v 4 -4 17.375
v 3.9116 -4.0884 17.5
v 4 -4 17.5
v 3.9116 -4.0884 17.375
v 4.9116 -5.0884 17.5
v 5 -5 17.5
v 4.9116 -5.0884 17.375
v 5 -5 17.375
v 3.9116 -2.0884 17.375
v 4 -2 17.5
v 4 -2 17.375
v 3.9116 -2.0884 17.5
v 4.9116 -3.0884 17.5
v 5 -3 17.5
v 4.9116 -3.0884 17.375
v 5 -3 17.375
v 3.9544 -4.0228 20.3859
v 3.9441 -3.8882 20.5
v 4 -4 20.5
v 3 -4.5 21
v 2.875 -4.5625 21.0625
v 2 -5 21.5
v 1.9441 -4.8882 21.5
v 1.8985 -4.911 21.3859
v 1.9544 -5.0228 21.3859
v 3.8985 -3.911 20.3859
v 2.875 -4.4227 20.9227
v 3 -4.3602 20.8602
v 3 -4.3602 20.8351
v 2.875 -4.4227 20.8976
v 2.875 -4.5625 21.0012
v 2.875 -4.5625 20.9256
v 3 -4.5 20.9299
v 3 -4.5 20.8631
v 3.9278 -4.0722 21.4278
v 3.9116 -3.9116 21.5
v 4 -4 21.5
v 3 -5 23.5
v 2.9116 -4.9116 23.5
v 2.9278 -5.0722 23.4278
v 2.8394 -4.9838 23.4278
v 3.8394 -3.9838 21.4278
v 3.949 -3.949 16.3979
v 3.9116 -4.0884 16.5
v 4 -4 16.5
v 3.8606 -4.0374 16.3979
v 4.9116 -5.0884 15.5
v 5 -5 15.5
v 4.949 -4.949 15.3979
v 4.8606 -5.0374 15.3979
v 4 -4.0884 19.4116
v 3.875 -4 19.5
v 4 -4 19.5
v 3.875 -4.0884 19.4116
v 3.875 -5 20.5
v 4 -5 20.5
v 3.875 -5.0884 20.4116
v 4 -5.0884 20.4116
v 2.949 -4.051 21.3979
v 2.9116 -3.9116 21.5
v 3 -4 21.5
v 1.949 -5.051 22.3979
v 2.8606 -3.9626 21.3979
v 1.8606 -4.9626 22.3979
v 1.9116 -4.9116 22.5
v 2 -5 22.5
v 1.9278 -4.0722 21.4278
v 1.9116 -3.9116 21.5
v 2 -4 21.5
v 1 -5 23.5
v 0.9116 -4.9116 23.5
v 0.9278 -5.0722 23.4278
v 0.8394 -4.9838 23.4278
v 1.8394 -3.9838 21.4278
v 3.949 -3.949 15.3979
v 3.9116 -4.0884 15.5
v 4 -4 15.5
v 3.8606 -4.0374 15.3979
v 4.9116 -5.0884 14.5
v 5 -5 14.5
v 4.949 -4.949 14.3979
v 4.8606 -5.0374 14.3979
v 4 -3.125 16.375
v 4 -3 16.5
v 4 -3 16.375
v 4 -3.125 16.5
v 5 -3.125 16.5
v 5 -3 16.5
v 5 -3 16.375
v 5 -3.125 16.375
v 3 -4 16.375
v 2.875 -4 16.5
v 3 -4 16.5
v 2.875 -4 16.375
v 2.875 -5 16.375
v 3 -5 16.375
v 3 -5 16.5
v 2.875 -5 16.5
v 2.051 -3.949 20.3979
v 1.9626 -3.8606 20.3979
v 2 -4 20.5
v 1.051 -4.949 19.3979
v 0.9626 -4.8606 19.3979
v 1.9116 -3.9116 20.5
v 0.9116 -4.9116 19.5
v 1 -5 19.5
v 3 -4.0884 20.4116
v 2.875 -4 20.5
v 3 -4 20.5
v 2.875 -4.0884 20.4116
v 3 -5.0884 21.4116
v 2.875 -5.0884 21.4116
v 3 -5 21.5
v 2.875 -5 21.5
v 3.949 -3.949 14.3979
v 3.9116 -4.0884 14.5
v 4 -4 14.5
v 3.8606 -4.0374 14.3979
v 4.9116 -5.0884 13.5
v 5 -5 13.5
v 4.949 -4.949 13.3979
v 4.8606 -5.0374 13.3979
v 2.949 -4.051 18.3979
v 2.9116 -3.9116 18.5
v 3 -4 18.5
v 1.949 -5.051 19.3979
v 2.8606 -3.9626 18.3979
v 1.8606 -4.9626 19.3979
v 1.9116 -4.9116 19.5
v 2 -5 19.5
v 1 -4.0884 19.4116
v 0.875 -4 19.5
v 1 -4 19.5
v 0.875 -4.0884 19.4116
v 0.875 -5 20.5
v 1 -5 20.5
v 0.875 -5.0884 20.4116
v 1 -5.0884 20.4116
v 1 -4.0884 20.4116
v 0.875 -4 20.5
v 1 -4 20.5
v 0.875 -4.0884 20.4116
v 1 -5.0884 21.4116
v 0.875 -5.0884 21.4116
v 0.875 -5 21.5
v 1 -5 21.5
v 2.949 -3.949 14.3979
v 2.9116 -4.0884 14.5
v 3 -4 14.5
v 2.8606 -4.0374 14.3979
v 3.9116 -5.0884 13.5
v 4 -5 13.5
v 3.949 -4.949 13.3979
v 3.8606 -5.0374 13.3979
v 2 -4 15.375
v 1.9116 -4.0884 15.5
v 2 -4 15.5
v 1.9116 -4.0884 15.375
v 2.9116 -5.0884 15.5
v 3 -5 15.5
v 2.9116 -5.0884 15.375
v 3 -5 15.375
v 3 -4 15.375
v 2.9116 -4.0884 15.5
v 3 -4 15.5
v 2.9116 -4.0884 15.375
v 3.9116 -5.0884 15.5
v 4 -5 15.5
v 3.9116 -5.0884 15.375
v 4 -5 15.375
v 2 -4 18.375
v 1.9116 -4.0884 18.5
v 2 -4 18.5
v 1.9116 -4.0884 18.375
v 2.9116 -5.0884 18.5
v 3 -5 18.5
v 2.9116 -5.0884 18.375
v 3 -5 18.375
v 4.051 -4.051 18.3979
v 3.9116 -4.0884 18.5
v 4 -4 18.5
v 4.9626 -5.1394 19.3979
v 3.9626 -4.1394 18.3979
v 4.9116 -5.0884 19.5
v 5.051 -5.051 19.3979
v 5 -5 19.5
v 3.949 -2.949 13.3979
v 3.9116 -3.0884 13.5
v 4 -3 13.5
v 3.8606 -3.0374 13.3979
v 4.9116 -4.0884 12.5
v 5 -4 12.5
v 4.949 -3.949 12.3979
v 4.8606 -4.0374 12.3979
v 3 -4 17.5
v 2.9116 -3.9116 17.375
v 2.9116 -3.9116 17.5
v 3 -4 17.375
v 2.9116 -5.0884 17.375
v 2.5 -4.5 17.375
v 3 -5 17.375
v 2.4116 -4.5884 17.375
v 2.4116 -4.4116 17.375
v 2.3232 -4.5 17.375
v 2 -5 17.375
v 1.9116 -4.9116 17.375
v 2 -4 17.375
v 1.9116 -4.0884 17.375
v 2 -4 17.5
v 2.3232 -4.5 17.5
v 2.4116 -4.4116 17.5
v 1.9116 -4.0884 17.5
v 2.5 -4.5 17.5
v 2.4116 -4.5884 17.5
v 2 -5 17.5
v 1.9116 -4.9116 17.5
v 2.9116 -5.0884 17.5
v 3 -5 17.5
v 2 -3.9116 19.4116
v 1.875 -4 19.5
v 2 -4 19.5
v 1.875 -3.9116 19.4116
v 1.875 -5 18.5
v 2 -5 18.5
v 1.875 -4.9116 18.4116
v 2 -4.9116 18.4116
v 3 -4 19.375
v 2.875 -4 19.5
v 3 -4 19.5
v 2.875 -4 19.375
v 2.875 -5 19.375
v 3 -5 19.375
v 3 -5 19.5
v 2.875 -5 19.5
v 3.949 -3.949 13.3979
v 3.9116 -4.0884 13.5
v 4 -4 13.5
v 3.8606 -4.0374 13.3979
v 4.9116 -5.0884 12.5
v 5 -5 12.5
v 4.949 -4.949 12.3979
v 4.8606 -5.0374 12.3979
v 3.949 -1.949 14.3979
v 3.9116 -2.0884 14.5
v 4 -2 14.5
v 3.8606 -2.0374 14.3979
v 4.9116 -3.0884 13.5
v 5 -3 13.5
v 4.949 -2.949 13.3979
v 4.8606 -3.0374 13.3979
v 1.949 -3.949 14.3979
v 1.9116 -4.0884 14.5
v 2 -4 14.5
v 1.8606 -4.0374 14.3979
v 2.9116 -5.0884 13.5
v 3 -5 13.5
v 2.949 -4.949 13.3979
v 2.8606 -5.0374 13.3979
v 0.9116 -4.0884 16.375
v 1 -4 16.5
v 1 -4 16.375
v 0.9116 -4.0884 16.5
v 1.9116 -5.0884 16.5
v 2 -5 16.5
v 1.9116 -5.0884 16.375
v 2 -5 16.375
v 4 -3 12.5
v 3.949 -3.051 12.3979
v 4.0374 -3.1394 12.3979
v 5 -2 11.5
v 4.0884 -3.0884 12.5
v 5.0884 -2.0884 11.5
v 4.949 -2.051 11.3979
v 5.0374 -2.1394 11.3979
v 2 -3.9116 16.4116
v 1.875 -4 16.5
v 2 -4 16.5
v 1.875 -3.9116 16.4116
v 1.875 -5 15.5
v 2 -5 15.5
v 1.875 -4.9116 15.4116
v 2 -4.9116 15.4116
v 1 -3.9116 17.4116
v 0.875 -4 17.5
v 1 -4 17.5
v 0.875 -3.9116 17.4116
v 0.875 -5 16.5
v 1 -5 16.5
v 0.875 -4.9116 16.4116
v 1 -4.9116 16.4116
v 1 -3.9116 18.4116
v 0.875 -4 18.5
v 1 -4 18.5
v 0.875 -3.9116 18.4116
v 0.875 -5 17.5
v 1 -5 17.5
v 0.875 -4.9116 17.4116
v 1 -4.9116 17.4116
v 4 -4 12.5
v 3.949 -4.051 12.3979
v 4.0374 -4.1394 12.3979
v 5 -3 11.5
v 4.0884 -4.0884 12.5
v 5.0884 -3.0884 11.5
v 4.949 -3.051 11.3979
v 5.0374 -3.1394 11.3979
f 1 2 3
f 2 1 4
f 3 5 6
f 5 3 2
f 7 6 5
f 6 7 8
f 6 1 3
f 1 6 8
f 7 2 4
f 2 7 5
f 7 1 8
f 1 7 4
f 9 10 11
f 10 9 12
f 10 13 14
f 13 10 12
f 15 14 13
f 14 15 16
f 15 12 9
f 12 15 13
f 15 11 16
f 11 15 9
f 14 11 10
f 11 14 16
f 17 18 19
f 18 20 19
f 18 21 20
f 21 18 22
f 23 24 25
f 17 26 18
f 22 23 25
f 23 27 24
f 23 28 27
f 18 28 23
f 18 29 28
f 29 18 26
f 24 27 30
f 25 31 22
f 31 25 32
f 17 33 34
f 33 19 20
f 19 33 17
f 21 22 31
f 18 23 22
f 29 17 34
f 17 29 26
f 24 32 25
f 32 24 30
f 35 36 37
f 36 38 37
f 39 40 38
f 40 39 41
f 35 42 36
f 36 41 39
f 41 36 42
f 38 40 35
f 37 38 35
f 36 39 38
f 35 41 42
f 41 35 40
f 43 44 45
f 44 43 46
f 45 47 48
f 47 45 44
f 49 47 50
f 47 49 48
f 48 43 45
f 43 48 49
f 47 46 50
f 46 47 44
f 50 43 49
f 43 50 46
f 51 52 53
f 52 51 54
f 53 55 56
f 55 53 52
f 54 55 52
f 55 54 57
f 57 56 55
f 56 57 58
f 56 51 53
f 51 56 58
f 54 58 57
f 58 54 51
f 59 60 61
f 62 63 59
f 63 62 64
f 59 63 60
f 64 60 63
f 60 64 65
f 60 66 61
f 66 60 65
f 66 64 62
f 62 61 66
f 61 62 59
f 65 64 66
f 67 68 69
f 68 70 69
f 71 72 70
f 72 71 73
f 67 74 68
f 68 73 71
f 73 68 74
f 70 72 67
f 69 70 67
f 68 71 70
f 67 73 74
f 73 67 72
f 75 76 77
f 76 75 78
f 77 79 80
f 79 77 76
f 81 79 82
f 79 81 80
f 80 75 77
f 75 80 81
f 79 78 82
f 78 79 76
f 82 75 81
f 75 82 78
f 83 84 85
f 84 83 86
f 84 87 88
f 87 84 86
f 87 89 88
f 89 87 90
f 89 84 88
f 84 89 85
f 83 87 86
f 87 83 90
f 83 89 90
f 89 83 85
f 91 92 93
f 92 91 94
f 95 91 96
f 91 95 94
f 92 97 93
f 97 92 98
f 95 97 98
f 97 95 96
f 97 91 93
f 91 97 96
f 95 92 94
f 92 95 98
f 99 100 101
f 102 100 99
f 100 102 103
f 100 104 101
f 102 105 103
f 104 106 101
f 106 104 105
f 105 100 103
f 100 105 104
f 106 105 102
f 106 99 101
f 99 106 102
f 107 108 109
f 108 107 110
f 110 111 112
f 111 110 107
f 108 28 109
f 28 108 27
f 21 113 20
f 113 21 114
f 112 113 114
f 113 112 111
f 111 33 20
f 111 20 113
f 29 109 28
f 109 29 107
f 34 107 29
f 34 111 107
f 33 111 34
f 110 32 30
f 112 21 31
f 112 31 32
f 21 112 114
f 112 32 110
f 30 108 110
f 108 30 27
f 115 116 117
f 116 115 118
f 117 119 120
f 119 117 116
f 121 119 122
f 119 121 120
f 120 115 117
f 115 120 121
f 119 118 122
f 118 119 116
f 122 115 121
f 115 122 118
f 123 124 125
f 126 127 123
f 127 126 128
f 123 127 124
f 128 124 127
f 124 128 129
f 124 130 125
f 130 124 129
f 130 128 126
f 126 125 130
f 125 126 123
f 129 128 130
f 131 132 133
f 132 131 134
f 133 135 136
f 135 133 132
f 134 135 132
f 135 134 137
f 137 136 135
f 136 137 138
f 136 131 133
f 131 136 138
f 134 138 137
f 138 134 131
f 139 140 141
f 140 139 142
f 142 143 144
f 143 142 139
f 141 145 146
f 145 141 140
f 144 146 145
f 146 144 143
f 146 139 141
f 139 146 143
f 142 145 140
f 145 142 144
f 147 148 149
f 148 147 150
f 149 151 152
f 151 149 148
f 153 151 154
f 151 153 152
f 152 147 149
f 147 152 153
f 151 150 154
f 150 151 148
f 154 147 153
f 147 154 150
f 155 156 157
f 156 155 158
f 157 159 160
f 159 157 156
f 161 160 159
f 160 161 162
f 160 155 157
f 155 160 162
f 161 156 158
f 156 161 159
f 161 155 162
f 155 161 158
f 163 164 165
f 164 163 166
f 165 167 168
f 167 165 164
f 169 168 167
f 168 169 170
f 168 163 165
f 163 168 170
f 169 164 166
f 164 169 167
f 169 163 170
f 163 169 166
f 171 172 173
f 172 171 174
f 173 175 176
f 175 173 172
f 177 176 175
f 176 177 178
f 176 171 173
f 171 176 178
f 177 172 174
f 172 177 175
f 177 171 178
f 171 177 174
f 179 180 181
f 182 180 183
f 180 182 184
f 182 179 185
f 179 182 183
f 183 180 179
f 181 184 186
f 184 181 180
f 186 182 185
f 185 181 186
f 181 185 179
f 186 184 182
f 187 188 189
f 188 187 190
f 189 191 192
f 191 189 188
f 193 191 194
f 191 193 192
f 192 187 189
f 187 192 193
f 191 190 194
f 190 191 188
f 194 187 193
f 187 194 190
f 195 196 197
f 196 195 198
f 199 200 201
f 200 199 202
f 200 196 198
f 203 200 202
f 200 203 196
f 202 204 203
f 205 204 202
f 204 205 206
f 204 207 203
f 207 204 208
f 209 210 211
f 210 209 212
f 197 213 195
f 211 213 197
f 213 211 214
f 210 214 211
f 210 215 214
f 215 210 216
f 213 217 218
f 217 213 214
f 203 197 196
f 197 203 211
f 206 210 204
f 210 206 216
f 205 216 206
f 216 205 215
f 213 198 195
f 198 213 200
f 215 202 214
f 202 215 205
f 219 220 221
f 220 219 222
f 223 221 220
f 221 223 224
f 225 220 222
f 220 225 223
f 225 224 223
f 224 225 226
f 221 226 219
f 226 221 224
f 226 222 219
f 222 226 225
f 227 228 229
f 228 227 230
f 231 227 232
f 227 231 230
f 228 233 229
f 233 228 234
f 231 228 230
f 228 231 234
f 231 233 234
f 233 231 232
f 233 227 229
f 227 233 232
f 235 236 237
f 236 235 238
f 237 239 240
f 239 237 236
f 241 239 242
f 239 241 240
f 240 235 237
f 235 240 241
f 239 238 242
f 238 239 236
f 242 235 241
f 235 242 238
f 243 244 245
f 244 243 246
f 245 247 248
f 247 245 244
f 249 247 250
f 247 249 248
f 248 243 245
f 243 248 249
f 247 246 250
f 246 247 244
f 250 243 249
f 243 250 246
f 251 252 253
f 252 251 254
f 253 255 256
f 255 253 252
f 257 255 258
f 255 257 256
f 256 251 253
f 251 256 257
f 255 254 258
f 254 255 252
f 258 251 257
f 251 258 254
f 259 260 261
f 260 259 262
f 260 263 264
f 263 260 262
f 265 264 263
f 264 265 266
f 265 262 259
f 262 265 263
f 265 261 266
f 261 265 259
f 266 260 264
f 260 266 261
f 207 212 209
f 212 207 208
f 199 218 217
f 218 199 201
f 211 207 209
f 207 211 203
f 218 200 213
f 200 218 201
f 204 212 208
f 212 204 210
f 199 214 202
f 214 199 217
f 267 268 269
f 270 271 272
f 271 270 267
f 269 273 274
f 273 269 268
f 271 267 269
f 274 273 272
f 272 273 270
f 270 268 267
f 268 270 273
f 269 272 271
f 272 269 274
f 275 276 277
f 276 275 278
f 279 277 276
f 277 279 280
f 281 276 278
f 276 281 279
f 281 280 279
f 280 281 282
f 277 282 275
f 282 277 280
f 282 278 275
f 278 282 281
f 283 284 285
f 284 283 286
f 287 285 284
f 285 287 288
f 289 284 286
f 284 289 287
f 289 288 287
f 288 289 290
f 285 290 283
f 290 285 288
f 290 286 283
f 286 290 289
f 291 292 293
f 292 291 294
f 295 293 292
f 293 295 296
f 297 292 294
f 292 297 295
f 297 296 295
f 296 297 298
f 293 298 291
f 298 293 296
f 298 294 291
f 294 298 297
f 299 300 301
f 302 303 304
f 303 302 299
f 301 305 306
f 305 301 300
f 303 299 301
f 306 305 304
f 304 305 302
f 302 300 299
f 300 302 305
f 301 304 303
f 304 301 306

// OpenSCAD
translate(v = [-0.5, -0.5, 0]) {
	/*Shell 0*/
	union() {
		%/*Nodes shell 0*/
		union();
		/*Edges shell 0*/
		union();
	}
	/*Shell 1*/
	union() {
		%/*Nodes shell 1*/
		union();
		/*Edges shell 1*/
		union();
	}
	/*Shell 2*/
	union() {
		%/*Nodes shell 2*/
		union();
		/*Edges shell 2*/
		union();
	}
	/*Shell 3*/
	union() {
		%/*Nodes shell 3*/
		union() {
			/*Node bank.devices[0].thingy.vbead_in*/
			color(alpha = 0.1, c = "black") {
				translate(v = [4, -4, 17]) {
					cube(size = [1, 1, 1]);
				}
			}
			/*Node bank.devices[0].thingy.vbead_out*/
			color(alpha = 0.1, c = "black") {
				translate(v = [4, -2, 17]) {
					cube(size = [1, 1, 1]);
				}
			}
			/*Node bank.devices[0].thingy.vcell_in*/
			color(alpha = 0.1, c = "black") {
				translate(v = [4, -4, 20]) {
					cube(size = [1, 1, 1]);
				}
			}
			/*Node bank.devices[0].thingy.vcell_out*/
			color(alpha = 0.1, c = "black") {
				translate(v = [4, -4, 21]) {
					cube(size = [1, 1, 1]);
				}
			}
			/*Node bank.devices[0].thingy.vcollect*/
			color(alpha = 0.1, c = "black") {
				translate(v = [4, -4, 16]) {
					cube(size = [1, 1, 1]);
				}
			}
			/*Node bank.devices[0].thingy.vlysis_in*/
			color(alpha = 0.1, c = "black") {
				translate(v = [4, -4, 19]) {
					cube(size = [1, 1, 1]);
				}
			}
			/*Node bank.devices[0].thingy.vlysis_out*/
			color(alpha = 0.1, c = "black") {
				translate(v = [3, -4, 21]) {
					cube(size = [1, 1, 1]);
				}
			}
			/*Node bank.devices[0].thingy.vpush*/
			color(alpha = 0.1, c = "black") {
				translate(v = [2, -4, 21]) {
					cube(size = [1, 1, 1]);
				}
			}
			/*Node bank.devices[0].thingy.vwaste*/
			color(alpha = 0.1, c = "black") {
				translate(v = [4, -4, 15]) {
					cube(size = [1, 1, 1]);
				}
			}
			/*Node bank.devices[1].thingy.vbead_in*/
			color(alpha = 0.1, c = "black") {
				translate(v = [4, -3, 16]) {
					cube(size = [1, 1, 1]);
				}
			}
			/*Node bank.devices[1].thingy.vbead_out*/
			color(alpha = 0.1, c = "black") {
				translate(v = [3, -4, 16]) {
					cube(size = [1, 1, 1]);
				}
			}
			/*Node bank.devices[1].thingy.vcell_in*/
			color(alpha = 0.1, c = "black") {
				translate(v = [2, -4, 20]) {
					cube(size = [1, 1, 1]);
				}
			}
			/*Node bank.devices[1].thingy.vcell_out*/
			color(alpha = 0.1, c = "black") {
				translate(v = [3, -4, 20]) {
					cube(size = [1, 1, 1]);
				}
			}
			/*Node bank.devices[1].thingy.vcollect*/
			color(alpha = 0.1, c = "black") {
				translate(v = [4, -4, 14]) {
					cube(size = [1, 1, 1]);
				}
			}
			/*Node bank.devices[1].thingy.vlysis_in*/
			color(alpha = 0.1, c = "black") {
				translate(v = [3, -4, 18]) {
					cube(size = [1, 1, 1]);
				}
			}
			/*Node bank.devices[1].thingy.vlysis_out*/
			color(alpha = 0.1, c = "black") {
				translate(v = [1, -4, 19]) {
					cube(size = [1, 1, 1]);
				}
			}
			/*Node bank.devices[1].thingy.vpush*/
			color(alpha = 0.1, c = "black") {
				translate(v = [1, -4, 20]) {
					cube(size = [1, 1, 1]);
				}
			}
			/*Node bank.devices[1].thingy.vwaste*/
			color(alpha = 0.1, c = "black") {
				translate(v = [3, -4, 14]) {
					cube(size = [1, 1, 1]);
				}
			}
			/*Node bank.devices[2].thingy.vbead_in*/
			color(alpha = 0.1, c = "black") {
				translate(v = [2, -4, 15]) {
					cube(size = [1, 1, 1]);
				}
			}
			/*Node bank.devices[2].thingy.vbead_out*/
			color(alpha = 0.1, c = "black") {
				translate(v = [3, -4, 15]) {
					cube(size = [1, 1, 1]);
				}
			}
			/*Node bank.devices[2].thingy.vcell_in*/
			color(alpha = 0.1, c = "black") {
				translate(v = [2, -4, 18]) {
					cube(size = [1, 1, 1]);
				}
			}
			/*Node bank.devices[2].thingy.vcell_out*/
			color(alpha = 0.1, c = "black") {
				translate(v = [4, -4, 18]) {
					cube(size = [1, 1, 1]);
				}
			}
			/*Node bank.devices[2].thingy.vcollect*/
			color(alpha = 0.1, c = "black") {
				translate(v = [4, -3, 13]) {
					cube(size = [1, 1, 1]);
				}
			}
			/*Node bank.devices[2].thingy.vlysis_in*/
			color(alpha = 0.1, c = "black") {
				translate(v = [3, -4, 17]) {
					cube(size = [1, 1, 1]);
				}
			}
			/*Node bank.devices[2].thingy.vlysis_out*/
			color(alpha = 0.1, c = "black") {
				translate(v = [2, -4, 19]) {
					cube(size = [1, 1, 1]);
				}
			}
			/*Node bank.devices[2].thingy.vpush*/
			color(alpha = 0.1, c = "black") {
				translate(v = [3, -4, 19]) {
					cube(size = [1, 1, 1]);
				}
			}
			/*Node bank.devices[2].thingy.vwaste*/
			color(alpha = 0.1, c = "black") {
				translate(v = [4, -4, 13]) {
					cube(size = [1, 1, 1]);
				}
			}
			/*Node bank.devices[3].thingy.vbead_in*/
			color(alpha = 0.1, c = "black") {
				translate(v = [4, -2, 14]) {
					cube(size = [1, 1, 1]);
				}
			}
			/*Node bank.devices[3].thingy.vbead_out*/
			color(alpha = 0.1, c = "black") {
				translate(v = [2, -4, 14]) {
					cube(size = [1, 1, 1]);
				}
			}
			/*Node bank.devices[3].thingy.vcell_in*/
			color(alpha = 0.1, c = "black") {
				translate(v = [1, -4, 16]) {
					cube(size = [1, 1, 1]);
				}
			}
			/*Node bank.devices[3].thingy.vcell_out*/
			color(alpha = 0.1, c = "black") {
				translate(v = [2, -4, 17]) {
					cube(size = [1, 1, 1]);
				}
			}
			/*Node bank.devices[3].thingy.vcollect*/
			color(alpha = 0.1, c = "black") {
				translate(v = [4, -3, 12]) {
					cube(size = [1, 1, 1]);
				}
			}
			/*Node bank.devices[3].thingy.vlysis_in*/
			color(alpha = 0.1, c = "black") {
				translate(v = [2, -4, 16]) {
					cube(size = [1, 1, 1]);
				}
			}
			/*Node bank.devices[3].thingy.vlysis_out*/
			color(alpha = 0.1, c = "black") {
				translate(v = [1, -4, 17]) {
					cube(size = [1, 1, 1]);
				}
			}
			/*Node bank.devices[3].thingy.vpush*/
			color(alpha = 0.1, c = "black") {
				translate(v = [1, -4, 18]) {
					cube(size = [1, 1, 1]);
				}
			}
			/*Node bank.devices[3].thingy.vwaste*/
			color(alpha = 0.1, c = "black") {
				translate(v = [4, -4, 12]) {
					cube(size = [1, 1, 1]);
				}
			}
		}
		/*Edges shell 3*/
		union() {
			/*Edge 2 from bank.devices[0].thingy.vbead_in to $_2*/
			translate(v = [5.5, -4.5, 17.5]) {
				rotate(a = [0, 90.0, 135.0]) {
					cube(size = [0.125, 0.125, 1.4142135623730951]);
				}
			}
			/*Edge 6 from bank.devices[0].thingy.vbead_out to $_6*/
			translate(v = [5.5, -2.5, 17.5]) {
				rotate(a = [0, 90.0, 135.0]) {
					cube(size = [0.125, 0.125, 1.4142135623730951]);
				}
			}
			/*Edge 10 from bank.devices[0].thingy.vcell_in to $_10*/
			translate(v = [2.5, -4.5, 21.5]) {
				rotate(a = [0, 114.09484255211072, 26.56505117707799]) {
					cube(size = [0.125, 0.125, 2.449489742783178]);
				}
			}
			/*Edge 14 from bank.devices[0].thingy.vcell_out to $_14*/
			translate(v = [3.5, -4.5, 23.5]) {
				rotate(a = [0, 144.73561031724537, 45.0]) {
					cube(size = [0.125, 0.125, 2.449489742783178]);
				}
			}
			/*Edge 18 from bank.devices[0].thingy.vcollect to $_18*/
			translate(v = [5.5, -4.5, 15.5]) {
				rotate(a = [0, 54.735610317245346, 135.0]) {
					cube(size = [0.125, 0.125, 1.7320508075688772]);
				}
			}
			/*Edge 22 from bank.devices[0].thingy.vlysis_in to $_22*/
			translate(v = [4.5, -4.5, 20.5]) {
				rotate(a = [0, 135.0, 90.0]) {
					cube(size = [0.125, 0.125, 1.4142135623730951]);
				}
			}
			/*Edge 26 from bank.devices[0].thingy.vlysis_out to $_26*/
			translate(v = [2.5, -4.5, 22.5]) {
				rotate(a = [0, 125.26438968275465, 45.0]) {
					cube(size = [0.125, 0.125, 1.7320508075688772]);
				}
			}
			/*Edge 30 from bank.devices[0].thingy.vpush to $_30*/
			translate(v = [1.5, -4.5, 23.5]) {
				rotate(a = [0, 144.73561031724537, 45.0]) {
					cube(size = [0.125, 0.125, 2.449489742783178]);
				}
			}
			/*Edge 34 from bank.devices[0].thingy.vwaste to $_34*/
			translate(v = [5.5, -4.5, 14.5]) {
				rotate(a = [0, 54.735610317245346, 135.0]) {
					cube(size = [0.125, 0.125, 1.7320508075688772]);
				}
			}
			/*Edge 3 from bank.devices[1].thingy.vbead_in to $_3*/
			translate(v = [5.5, -2.5, 16.5]) {
				rotate(a = [0, 90.0, 180.0]) {
					cube(size = [0.125, 0.125, 1.0]);
				}
			}
			/*Edge 7 from bank.devices[1].thingy.vbead_out to $_7*/
			translate(v = [3.5, -4.5, 16.5]) {
				rotate(a = [0, 90.0, 90.0]) {
					cube(size = [0.125, 0.125, 1.0]);
				}
			}
			/*Edge 11 from bank.devices[1].thingy.vcell_in to $_11*/
			translate(v = [1.5, -4.5, 19.5]) {
				rotate(a = [0, 54.735610317245346, 45.0]) {
					cube(size = [0.125, 0.125, 1.7320508075688772]);
				}
			}
			/*Edge 15 from bank.devices[1].thingy.vcell_out to $_15*/
			translate(v = [3.5, -4.5, 21.5]) {
				rotate(a = [0, 135.0, 90.0]) {
					cube(size = [0.125, 0.125, 1.4142135623730951]);
				}
			}
			/*Edge 19 from bank.devices[1].thingy.vcollect to $_19*/
			translate(v = [5.5, -4.5, 13.5]) {
				rotate(a = [0, 54.735610317245346, 135.0]) {
					cube(size = [0.125, 0.125, 1.7320508075688772]);
				}
			}
			/*Edge 23 from bank.devices[1].thingy.vlysis_in to $_23*/
			translate(v = [2.5, -4.5, 19.5]) {
				rotate(a = [0, 125.26438968275465, 45.0]) {
					cube(size = [0.125, 0.125, 1.7320508075688772]);
				}
			}
			/*Edge 27 from bank.devices[1].thingy.vlysis_out to $_27*/
			translate(v = [1.5, -4.5, 20.5]) {
				rotate(a = [0, 135.0, 90.0]) {
					cube(size = [0.125, 0.125, 1.4142135623730951]);
				}
			}
			/*Edge 31 from bank.devices[1].thingy.vpush to $_31*/
			translate(v = [1.5, -4.5, 21.5]) {
				rotate(a = [0, 135.0, 90.0]) {
					cube(size = [0.125, 0.125, 1.4142135623730951]);
				}
			}
			/*Edge 35 from bank.devices[1].thingy.vwaste to $_35*/
			translate(v = [4.5, -4.5, 13.5]) {
				rotate(a = [0, 54.735610317245346, 135.0]) {
					cube(size = [0.125, 0.125, 1.7320508075688772]);
				}
			}
			/*Edge 4 from bank.devices[2].thingy.vbead_in to $_4*/
			translate(v = [3.5, -4.5, 15.5]) {
				rotate(a = [0, 90.0, 135.0]) {
					cube(size = [0.125, 0.125, 1.4142135623730951]);
				}
			}
			/*Edge 8 from bank.devices[2].thingy.vbead_out to $_8*/
			translate(v = [4.5, -4.5, 15.5]) {
				rotate(a = [0, 90.0, 135.0]) {
					cube(size = [0.125, 0.125, 1.4142135623730951]);
				}
			}
			/*Edge 12 from bank.devices[2].thingy.vcell_in to $_12*/
			translate(v = [3.5, -4.5, 18.5]) {
				rotate(a = [0, 90.0, 135.0]) {
					cube(size = [0.125, 0.125, 1.4142135623730951]);
				}
			}
			/*Edge 16 from bank.devices[2].thingy.vcell_out to $_16*/
			translate(v = [5.5, -4.5, 19.5]) {
				rotate(a = [0, 125.26438968275465, 135.0]) {
					cube(size = [0.125, 0.125, 1.7320508075688772]);
				}
			}
			/*Edge 20 from bank.devices[2].thingy.vcollect to $_20*/
			translate(v = [5.5, -3.5, 12.5]) {
				rotate(a = [0, 54.735610317245346, 135.0]) {
					cube(size = [0.125, 0.125, 1.7320508075688772]);
				}
			}
			/*Edge 24 from bank.devices[2].thingy.vlysis_in to $_24*/
			translate(v = [2.5, -4.5, 17.5]) {
				rotate(a = [0, 90.0, 45.0]) {
					cube(size = [0.125, 0.125, 1.4142135623730951]);
				}
			}
			/*Edge 28 from bank.devices[2].thingy.vlysis_out to $_28*/
			translate(v = [2.5, -4.5, 18.5]) {
				rotate(a = [0, 45.00000000000001, 90.0]) {
					cube(size = [0.125, 0.125, 1.4142135623730951]);
				}
			}
			/*Edge 32 from bank.devices[2].thingy.vpush to $_32*/
			translate(v = [3.5, -4.5, 19.5]) {
				rotate(a = [0, 90.0, 90.0]) {
					cube(size = [0.125, 0.125, 1.0]);
				}
			}
			/*Edge 36 from bank.devices[2].thingy.vwaste to $_36*/
			translate(v = [5.5, -4.5, 12.5]) {
				rotate(a = [0, 54.735610317245346, 135.0]) {
					cube(size = [0.125, 0.125, 1.7320508075688772]);
				}
			}
			/*Edge 5 from bank.devices[3].thingy.vbead_in to $_5*/
			translate(v = [5.5, -2.5, 13.5]) {
				rotate(a = [0, 54.735610317245346, 135.0]) {
					cube(size = [0.125, 0.125, 1.7320508075688772]);
				}
			}
			/*Edge 9 from bank.devices[3].thingy.vbead_out to $_9*/
			translate(v = [3.5, -4.5, 13.5]) {
				rotate(a = [0, 54.735610317245346, 135.0]) {
					cube(size = [0.125, 0.125, 1.7320508075688772]);
				}
			}
			/*Edge 13 from bank.devices[3].thingy.vcell_in to $_13*/
			translate(v = [2.5, -4.5, 16.5]) {
				rotate(a = [0, 90.0, 135.0]) {
					cube(size = [0.125, 0.125, 1.4142135623730951]);
				}
			}
			/*Edge 17 from bank.devices[3].thingy.vcell_out to $_17*/
			translate(v = [3.5, -4.5, 17.5]) {
				rotate(a = [0, 90.0, 135.0]) {
					cube(size = [0.125, 0.125, 1.4142135623730951]);
				}
			}
			/*Edge 21 from bank.devices[3].thingy.vcollect to $_21*/
			translate(v = [5.5, -1.5, 11.5]) {
				rotate(a = [0, 54.735610317245346, -135.0]) {
					cube(size = [0.125, 0.125, 1.7320508075688772]);
				}
			}
			/*Edge 25 from bank.devices[3].thingy.vlysis_in to $_25*/
			translate(v = [2.5, -4.5, 15.5]) {
				rotate(a = [0, 45.00000000000001, 90.0]) {
					cube(size = [0.125, 0.125, 1.4142135623730951]);
				}
			}
			/*Edge 29 from bank.devices[3].thingy.vlysis_out to $_29*/
			translate(v = [1.5, -4.5, 16.5]) {
				rotate(a = [0, 45.00000000000001, 90.0]) {
					cube(size = [0.125, 0.125, 1.4142135623730951]);
				}
			}
			/*Edge 33 from bank.devices[3].thingy.vpush to $_33*/
			translate(v = [1.5, -4.5, 17.5]) {
				rotate(a = [0, 45.00000000000001, 90.0]) {
					cube(size = [0.125, 0.125, 1.4142135623730951]);
				}
			}
			/*Edge 37 from bank.devices[3].thingy.vwaste to $_37*/
			translate(v = [5.5, -2.5, 11.5]) {
				rotate(a = [0, 54.735610317245346, -135.0]) {
					cube(size = [0.125, 0.125, 1.7320508075688772]);
				}
			}
		}
	}
	/*Shell 4*/
	union() {
		%/*Nodes shell 4*/
		union() {
			/*Node $_2*/
			color(alpha = 0.1, c = "pink") {
				translate(v = [5, -5, 17]) {
					cube(size = [1, 1, 1]);
				}
			}
			/*Node $_6*/
			color(alpha = 0.1, c = "pink") {
				translate(v = [5, -3, 17]) {
					cube(size = [1, 1, 1]);
				}
			}
			/*Node $_10*/
			color(alpha = 0.1, c = "pink") {
				translate(v = [2, -5, 21]) {
					cube(size = [1, 1, 1]);
				}
			}
			/*Node $_14*/
			color(alpha = 0.1, c = "pink") {
				translate(v = [3, -5, 23]) {
					cube(size = [1, 1, 1]);
				}
			}
			/*Node $_18*/
			color(alpha = 0.1, c = "pink") {
				translate(v = [5, -5, 15]) {
					cube(size = [1, 1, 1]);
				}
			}
			/*Node $_22*/
			color(alpha = 0.1, c = "pink") {
				translate(v = [4, -5, 20]) {
					cube(size = [1, 1, 1]);
				}
			}
			/*Node $_26*/
			color(alpha = 0.1, c = "pink") {
				translate(v = [2, -5, 22]) {
					cube(size = [1, 1, 1]);
				}
			}
			/*Node $_30*/
			color(alpha = 0.1, c = "pink") {
				translate(v = [1, -5, 23]) {
					cube(size = [1, 1, 1]);
				}
			}
			/*Node $_34*/
			color(alpha = 0.1, c = "pink") {
				translate(v = [5, -5, 14]) {
					cube(size = [1, 1, 1]);
				}
			}
			/*Node $_3*/
			color(alpha = 0.1, c = "pink") {
				translate(v = [5, -3, 16]) {
					cube(size = [1, 1, 1]);
				}
			}
			/*Node $_7*/
			color(alpha = 0.1, c = "pink") {
				translate(v = [3, -5, 16]) {
					cube(size = [1, 1, 1]);
				}
			}
			/*Node $_11*/
			color(alpha = 0.1, c = "pink") {
				translate(v = [1, -5, 19]) {
					cube(size = [1, 1, 1]);
				}
			}
			/*Node $_15*/
			color(alpha = 0.1, c = "pink") {
				translate(v = [3, -5, 21]) {
					cube(size = [1, 1, 1]);
				}
			}
			/*Node $_19*/
			color(alpha = 0.1, c = "pink") {
				translate(v = [5, -5, 13]) {
					cube(size = [1, 1, 1]);
				}
			}
			/*Node $_23*/
			color(alpha = 0.1, c = "pink") {
				translate(v = [2, -5, 19]) {
					cube(size = [1, 1, 1]);
				}
			}
			/*Node $_27*/
			color(alpha = 0.1, c = "pink") {
				translate(v = [1, -5, 20]) {
					cube(size = [1, 1, 1]);
				}
			}
			/*Node $_31*/
			color(alpha = 0.1, c = "pink") {
				translate(v = [1, -5, 21]) {
					cube(size = [1, 1, 1]);
				}
			}
			/*Node $_35*/
			color(alpha = 0.1, c = "pink") {
				translate(v = [4, -5, 13]) {
					cube(size = [1, 1, 1]);
				}
			}
			/*Node $_4*/
			color(alpha = 0.1, c = "pink") {
				translate(v = [3, -5, 15]) {
					cube(size = [1, 1, 1]);
				}
			}
			/*Node $_8*/
			color(alpha = 0.1, c = "pink") {
				translate(v = [4, -5, 15]) {
					cube(size = [1, 1, 1]);
				}
			}
			/*Node $_12*/
			color(alpha = 0.1, c = "pink") {
				translate(v = [3, -5, 18]) {
					cube(size = [1, 1, 1]);
				}
			}
			/*Node $_16*/
			color(alpha = 0.1, c = "pink") {
				translate(v = [5, -5, 19]) {
					cube(size = [1, 1, 1]);
				}
			}
			/*Node $_20*/
			color(alpha = 0.1, c = "pink") {
				translate(v = [5, -4, 12]) {
					cube(size = [1, 1, 1]);
				}
			}
			/*Node $_24*/
			color(alpha = 0.1, c = "pink") {
				translate(v = [2, -5, 17]) {
					cube(size = [1, 1, 1]);
				}
			}
			/*Node $_28*/
			color(alpha = 0.1, c = "pink") {
				translate(v = [2, -5, 18]) {
					cube(size = [1, 1, 1]);
				}
			}
			/*Node $_32*/
			color(alpha = 0.1, c = "pink") {
				translate(v = [3, -5, 19]) {
					cube(size = [1, 1, 1]);
				}
			}
			/*Node $_36*/
			color(alpha = 0.1, c = "pink") {
				translate(v = [5, -5, 12]) {
					cube(size = [1, 1, 1]);
				}
			}
			/*Node $_5*/
			color(alpha = 0.1, c = "pink") {
				translate(v = [5, -3, 13]) {
					cube(size = [1, 1, 1]);
				}
			}
			/*Node $_9*/
			color(alpha = 0.1, c = "pink") {
				translate(v = [3, -5, 13]) {
					cube(size = [1, 1, 1]);
				}
			}
			/*Node $_13*/
			color(alpha = 0.1, c = "pink") {
				translate(v = [2, -5, 16]) {
					cube(size = [1, 1, 1]);
				}
			}
			/*Node $_17*/
			color(alpha = 0.1, c = "pink") {
				translate(v = [3, -5, 17]) {
					cube(size = [1, 1, 1]);
				}
			}
			/*Node $_21*/
			color(alpha = 0.1, c = "pink") {
				translate(v = [5, -2, 11]) {
					cube(size = [1, 1, 1]);
				}
			}
			/*Node $_25*/
			color(alpha = 0.1, c = "pink") {
				translate(v = [2, -5, 15]) {
					cube(size = [1, 1, 1]);
				}
			}
			/*Node $_29*/
			color(alpha = 0.1, c = "pink") {
				translate(v = [1, -5, 16]) {
					cube(size = [1, 1, 1]);
				}
			}
			/*Node $_33*/
			color(alpha = 0.1, c = "pink") {
				translate(v = [1, -5, 17]) {
					cube(size = [1, 1, 1]);
				}
			}
			/*Node $_37*/
			color(alpha = 0.1, c = "pink") {
				translate(v = [5, -3, 11]) {
					cube(size = [1, 1, 1]);
				}
			}
		}
		/*Edges shell 4*/
		union();
	}
}
